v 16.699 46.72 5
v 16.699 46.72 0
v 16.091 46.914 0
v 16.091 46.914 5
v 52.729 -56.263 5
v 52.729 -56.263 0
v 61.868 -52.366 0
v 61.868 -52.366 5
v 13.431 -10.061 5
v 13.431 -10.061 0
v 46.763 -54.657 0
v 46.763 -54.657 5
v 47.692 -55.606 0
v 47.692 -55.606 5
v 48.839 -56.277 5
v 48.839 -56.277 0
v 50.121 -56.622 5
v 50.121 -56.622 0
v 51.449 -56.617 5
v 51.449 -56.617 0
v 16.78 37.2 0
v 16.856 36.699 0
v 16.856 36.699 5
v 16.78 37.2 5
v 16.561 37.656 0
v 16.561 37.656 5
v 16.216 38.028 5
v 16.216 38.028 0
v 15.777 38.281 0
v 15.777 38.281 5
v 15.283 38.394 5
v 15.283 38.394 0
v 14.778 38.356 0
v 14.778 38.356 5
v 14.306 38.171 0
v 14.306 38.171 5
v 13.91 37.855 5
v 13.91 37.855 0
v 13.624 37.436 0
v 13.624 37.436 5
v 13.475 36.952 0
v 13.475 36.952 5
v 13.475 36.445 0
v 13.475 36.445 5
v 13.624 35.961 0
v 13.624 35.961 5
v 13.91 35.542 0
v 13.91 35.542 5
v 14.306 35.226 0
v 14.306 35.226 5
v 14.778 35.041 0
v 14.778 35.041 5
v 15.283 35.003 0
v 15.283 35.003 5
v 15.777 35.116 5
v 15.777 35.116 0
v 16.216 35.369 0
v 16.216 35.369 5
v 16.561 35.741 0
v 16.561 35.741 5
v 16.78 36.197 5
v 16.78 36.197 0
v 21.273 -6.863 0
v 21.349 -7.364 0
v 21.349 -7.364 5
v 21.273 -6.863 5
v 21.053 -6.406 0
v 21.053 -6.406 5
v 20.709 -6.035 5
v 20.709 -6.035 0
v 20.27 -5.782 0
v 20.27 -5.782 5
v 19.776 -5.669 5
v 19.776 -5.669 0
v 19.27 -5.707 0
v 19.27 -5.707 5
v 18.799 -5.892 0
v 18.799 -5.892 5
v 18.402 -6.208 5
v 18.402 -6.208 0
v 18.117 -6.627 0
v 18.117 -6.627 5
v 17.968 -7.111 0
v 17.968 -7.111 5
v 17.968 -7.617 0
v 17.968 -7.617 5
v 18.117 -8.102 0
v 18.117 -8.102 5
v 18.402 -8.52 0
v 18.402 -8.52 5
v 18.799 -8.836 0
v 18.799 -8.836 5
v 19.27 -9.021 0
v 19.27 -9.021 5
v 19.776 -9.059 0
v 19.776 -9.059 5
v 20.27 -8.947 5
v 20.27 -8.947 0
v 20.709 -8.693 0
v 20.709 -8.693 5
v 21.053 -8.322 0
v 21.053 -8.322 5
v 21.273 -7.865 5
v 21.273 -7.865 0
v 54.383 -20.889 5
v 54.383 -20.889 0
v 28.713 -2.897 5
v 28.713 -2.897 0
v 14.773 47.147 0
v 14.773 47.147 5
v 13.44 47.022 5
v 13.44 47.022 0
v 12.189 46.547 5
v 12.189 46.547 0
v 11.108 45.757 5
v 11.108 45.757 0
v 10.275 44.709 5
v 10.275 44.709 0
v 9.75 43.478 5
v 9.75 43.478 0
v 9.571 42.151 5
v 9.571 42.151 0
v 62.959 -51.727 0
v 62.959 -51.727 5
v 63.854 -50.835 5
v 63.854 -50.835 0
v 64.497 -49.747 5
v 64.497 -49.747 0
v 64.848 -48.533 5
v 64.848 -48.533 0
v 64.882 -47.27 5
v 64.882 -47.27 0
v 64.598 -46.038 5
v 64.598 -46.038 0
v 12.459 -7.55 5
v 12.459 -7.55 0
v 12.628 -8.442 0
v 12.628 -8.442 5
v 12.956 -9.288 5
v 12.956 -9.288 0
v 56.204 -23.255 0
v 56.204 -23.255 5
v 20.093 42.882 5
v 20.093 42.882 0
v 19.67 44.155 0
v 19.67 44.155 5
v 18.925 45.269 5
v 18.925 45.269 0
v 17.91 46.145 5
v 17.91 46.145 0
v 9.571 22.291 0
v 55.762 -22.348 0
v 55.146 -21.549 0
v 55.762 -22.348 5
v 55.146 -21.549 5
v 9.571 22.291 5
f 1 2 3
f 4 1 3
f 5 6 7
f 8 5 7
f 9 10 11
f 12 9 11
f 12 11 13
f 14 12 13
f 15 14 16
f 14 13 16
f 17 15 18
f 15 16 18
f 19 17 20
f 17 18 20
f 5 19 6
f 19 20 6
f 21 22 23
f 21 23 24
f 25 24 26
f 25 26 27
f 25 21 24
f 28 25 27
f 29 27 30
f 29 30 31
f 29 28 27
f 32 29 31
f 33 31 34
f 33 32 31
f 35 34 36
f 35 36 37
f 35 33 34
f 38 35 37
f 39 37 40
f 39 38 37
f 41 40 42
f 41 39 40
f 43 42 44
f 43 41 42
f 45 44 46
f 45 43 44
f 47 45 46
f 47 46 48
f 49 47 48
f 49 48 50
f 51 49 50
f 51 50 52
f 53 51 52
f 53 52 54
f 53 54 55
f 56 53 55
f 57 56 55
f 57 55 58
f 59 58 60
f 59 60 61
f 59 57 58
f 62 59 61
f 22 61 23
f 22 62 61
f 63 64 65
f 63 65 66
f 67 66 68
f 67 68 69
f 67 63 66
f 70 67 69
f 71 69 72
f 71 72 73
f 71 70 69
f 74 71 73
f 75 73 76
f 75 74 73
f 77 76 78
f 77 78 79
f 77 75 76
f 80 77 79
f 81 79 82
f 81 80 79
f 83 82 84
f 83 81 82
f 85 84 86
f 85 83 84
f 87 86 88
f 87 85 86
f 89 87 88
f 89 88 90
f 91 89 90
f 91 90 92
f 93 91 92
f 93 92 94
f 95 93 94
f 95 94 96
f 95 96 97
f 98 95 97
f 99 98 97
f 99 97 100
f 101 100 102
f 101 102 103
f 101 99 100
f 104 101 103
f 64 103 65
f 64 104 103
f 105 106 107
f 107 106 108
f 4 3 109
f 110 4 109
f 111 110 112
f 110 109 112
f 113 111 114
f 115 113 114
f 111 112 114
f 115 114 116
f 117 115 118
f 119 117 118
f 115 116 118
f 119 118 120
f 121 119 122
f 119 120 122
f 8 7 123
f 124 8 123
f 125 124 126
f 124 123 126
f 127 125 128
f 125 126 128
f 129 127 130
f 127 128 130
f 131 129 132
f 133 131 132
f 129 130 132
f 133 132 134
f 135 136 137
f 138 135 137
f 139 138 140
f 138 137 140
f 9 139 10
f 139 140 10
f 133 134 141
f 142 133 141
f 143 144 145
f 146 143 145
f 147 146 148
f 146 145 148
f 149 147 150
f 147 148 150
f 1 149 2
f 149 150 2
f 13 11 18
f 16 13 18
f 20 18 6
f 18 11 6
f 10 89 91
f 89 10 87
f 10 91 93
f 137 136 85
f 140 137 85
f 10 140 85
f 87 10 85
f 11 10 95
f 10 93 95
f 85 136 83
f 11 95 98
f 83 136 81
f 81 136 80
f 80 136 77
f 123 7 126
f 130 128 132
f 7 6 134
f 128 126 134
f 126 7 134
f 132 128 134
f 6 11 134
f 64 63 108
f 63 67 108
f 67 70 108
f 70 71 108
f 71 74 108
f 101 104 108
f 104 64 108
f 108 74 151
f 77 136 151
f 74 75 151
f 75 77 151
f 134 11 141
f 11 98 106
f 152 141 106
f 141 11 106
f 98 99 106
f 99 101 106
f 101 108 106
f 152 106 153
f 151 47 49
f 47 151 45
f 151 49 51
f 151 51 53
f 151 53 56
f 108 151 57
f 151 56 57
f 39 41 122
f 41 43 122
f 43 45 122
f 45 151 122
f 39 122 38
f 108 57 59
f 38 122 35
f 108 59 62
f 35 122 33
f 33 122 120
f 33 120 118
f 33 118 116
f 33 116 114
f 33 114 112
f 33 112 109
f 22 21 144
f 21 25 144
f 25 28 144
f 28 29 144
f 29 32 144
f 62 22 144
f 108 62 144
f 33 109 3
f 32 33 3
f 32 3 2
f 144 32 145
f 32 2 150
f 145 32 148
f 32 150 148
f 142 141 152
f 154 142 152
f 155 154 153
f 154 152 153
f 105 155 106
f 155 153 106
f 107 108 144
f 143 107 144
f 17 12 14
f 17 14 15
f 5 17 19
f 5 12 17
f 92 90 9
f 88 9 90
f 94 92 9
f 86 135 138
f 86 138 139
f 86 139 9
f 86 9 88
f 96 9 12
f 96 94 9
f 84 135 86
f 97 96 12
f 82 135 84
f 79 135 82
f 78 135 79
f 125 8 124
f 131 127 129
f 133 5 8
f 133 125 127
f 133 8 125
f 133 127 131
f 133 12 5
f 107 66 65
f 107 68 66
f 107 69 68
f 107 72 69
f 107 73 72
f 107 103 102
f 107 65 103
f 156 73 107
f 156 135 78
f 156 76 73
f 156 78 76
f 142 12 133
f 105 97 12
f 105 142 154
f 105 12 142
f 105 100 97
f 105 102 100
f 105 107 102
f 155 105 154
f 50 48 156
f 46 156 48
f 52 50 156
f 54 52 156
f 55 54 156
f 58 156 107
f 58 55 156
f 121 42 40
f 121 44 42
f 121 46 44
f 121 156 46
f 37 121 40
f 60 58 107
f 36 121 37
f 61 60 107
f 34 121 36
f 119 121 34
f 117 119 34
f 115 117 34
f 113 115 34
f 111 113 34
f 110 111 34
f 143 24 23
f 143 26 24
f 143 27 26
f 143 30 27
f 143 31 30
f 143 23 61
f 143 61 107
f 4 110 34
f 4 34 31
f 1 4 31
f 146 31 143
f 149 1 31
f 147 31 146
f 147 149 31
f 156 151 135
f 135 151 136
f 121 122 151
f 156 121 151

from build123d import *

# Parameters (mm, degrees)
SKETCH1_R           = 1.7
BOSS_EXTRUDE1_DEPTH = 5


with BuildPart() as part:
    # Sketch1 → Boss-Extrude1 (new body)
    with BuildSketch(Plane.XY):
        with BuildLine():
            Line((9.571131615, 22.290661788), (12.45890696, -7.549683437))
            ThreePointArc((12.45890696, -7.549683437), (12.772506188, -8.872231039), (13.430707906, -10.06145227))
            Line((13.430707906, -10.06145227), (46.762768529, -54.65745062))
            ThreePointArc((46.762768529, -54.65745062), (49.46823245, -56.492242481), (52.729148127, -56.263277104))
            Line((52.729148127, -56.263277104), (61.868035374, -52.365810483))
            ThreePointArc((61.868035374, -52.365810483), (64.497484035, -49.747459847), (64.598320481, -46.038067399))
            Line((64.598320481, -46.038067399), (56.204499393, -23.254838732))
            ThreePointArc((56.204499393, -23.254838732), (55.474314099, -21.932746284), (54.382663092, -20.889004416))
            Line((54.382663092, -20.889004416), (28.713394846, -2.896526673))
            Line((28.713394846, -2.896526673), (20.09267624, 42.882461783))
            ThreePointArc((20.09267624, 42.882461783), (18.924854223, 45.269094952), (16.699240102, 46.720462558))
            Line((16.699240102, 46.720462558), (16.091332484, 46.914475628))
            ThreePointArc((16.091332484, 46.914475628), (11.621640502, 46.18856761), (9.571131615, 42.151179571))
            Line((9.571131615, 42.151179571), (9.571131615, 22.290661788))
        make_face()
        with Locations((15.155921835, 36.698515682)):
            Circle(SKETCH1_R, mode=Mode.SUBTRACT)
        with Locations((19.648657186, -7.364112555)):
            Circle(SKETCH1_R, mode=Mode.SUBTRACT)
    extrude(amount=BOSS_EXTRUDE1_DEPTH)


solid = part.part
